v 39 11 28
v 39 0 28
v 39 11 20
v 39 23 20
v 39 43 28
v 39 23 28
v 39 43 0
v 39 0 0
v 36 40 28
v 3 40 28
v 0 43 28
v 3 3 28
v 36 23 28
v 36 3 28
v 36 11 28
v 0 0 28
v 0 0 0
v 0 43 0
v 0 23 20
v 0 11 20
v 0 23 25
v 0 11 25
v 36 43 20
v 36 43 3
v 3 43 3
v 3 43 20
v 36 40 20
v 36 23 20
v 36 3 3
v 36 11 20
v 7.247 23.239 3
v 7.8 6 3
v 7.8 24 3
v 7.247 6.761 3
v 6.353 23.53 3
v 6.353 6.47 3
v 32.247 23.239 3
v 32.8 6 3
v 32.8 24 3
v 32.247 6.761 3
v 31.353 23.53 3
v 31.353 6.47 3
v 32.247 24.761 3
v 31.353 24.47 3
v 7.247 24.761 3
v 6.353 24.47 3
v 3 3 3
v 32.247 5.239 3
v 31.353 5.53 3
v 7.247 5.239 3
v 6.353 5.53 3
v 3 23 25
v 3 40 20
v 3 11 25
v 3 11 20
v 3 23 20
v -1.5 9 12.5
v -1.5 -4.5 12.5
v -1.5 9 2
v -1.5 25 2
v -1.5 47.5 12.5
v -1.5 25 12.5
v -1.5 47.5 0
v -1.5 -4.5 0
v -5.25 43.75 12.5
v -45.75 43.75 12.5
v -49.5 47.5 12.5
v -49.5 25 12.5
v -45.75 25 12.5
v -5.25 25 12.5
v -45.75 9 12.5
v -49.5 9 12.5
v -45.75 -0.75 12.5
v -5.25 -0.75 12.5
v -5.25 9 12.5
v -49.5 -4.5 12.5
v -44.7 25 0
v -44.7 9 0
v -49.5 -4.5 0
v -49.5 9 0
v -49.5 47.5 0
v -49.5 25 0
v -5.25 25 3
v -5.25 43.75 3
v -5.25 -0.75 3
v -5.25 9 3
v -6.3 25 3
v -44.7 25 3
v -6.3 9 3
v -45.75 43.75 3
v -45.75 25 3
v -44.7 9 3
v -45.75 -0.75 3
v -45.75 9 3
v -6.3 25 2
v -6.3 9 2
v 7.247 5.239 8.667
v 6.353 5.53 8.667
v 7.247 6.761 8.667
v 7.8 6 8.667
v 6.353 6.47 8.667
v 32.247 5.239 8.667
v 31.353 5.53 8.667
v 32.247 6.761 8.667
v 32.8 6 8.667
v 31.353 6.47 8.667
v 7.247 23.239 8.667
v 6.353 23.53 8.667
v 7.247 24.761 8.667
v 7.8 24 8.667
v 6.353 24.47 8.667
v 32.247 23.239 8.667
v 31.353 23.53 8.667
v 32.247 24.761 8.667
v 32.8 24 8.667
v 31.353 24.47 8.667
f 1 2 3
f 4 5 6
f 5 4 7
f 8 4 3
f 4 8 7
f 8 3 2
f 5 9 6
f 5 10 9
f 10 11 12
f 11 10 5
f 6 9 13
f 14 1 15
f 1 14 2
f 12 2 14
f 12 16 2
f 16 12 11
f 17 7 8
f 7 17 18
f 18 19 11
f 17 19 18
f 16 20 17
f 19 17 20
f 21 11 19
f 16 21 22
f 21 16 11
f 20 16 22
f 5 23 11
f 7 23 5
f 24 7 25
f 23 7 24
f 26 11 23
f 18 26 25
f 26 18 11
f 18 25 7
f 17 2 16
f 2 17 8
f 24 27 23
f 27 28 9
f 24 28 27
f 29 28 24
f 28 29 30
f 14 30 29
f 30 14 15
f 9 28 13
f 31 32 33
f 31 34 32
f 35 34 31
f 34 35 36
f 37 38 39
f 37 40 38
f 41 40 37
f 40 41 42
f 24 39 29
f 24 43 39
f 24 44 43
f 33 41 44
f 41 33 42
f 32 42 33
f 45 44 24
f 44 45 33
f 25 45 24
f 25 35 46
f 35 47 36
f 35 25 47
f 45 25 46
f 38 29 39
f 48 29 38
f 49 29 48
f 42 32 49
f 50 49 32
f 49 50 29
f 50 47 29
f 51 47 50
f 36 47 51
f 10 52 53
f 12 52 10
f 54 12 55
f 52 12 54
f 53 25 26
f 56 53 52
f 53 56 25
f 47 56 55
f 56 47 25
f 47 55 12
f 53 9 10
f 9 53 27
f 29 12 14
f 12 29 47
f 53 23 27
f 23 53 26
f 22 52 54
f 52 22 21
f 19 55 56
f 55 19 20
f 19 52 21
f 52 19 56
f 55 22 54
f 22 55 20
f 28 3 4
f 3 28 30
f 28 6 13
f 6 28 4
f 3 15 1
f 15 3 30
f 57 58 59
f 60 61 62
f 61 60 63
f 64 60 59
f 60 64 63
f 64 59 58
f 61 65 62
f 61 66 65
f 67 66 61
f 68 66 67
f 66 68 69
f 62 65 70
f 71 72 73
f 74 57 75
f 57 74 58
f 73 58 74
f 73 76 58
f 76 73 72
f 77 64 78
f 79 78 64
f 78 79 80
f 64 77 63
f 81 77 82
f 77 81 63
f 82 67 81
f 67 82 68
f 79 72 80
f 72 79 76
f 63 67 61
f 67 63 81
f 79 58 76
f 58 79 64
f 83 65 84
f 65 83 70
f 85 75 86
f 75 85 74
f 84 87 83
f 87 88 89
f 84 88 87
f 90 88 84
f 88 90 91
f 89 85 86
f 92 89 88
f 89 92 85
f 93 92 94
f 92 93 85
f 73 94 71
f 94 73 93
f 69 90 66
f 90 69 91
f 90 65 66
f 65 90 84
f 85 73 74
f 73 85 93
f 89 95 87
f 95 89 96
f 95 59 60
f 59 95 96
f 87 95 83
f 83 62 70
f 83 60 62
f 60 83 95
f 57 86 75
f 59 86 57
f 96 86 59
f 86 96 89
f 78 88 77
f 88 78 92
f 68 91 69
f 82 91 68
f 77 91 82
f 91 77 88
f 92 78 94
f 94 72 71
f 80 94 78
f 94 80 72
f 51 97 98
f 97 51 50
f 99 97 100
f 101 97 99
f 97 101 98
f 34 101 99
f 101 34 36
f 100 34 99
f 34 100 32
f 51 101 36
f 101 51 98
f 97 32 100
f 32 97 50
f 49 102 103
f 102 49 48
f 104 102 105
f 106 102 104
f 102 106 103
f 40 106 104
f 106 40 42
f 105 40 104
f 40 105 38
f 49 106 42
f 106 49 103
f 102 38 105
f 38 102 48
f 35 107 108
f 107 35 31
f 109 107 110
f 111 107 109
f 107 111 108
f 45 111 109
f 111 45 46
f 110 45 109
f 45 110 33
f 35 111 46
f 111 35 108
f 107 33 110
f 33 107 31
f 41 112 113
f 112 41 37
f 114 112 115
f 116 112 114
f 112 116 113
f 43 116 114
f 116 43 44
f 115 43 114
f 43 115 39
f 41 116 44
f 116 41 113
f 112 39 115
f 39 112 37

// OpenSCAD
// tbv schaakdingetje

// 24 naast elkaar, 32 breed
// 16 vooruit, 36 lang
// 14 hoog rs232, 20 binnen

thickness = 3;
pcb_width = 32 + 1;
pcb_length = 36 + 1;
wiring_height = 25;
connector_height = 17;
radius_pcb_holder = 0.8;

difference() {
  cube([pcb_width + thickness * 2, pcb_length + thickness * 2, wiring_height + thickness]);  // global box
  translate([thickness, thickness, thickness]) cube([pcb_width, pcb_length, wiring_height + 5]);  // inside
  translate([thickness, pcb_length + thickness-1, thickness]) cube([pcb_width, pcb_length + thickness * 2, connector_height]);  // rs232 connector hole
   // slot for usb connector
   translate([-thickness/2, thickness+8, thickness+wiring_height-8]) color([1,0,0]) cube([thickness*2, 12, 5]);
    // slot for antenna
   translate([-thickness/2 + pcb_length, thickness+8, thickness+wiring_height-8]) color([1,0,0]) cube([thickness*2, 12, thickness+8]);    
}

// left back
translate([thickness + 3 + 1, thickness + 3, thickness + connector_height /6]) cylinder(h=connector_height / 3, r1=radius_pcb_holder, r2=radius_pcb_holder, center=true);
// right back
translate([thickness + 24 + 4 + 1, thickness + 3, thickness + connector_height /6]) cylinder(h=connector_height / 3, r1=radius_pcb_holder, r2=radius_pcb_holder, center=true);
// left front
translate([thickness + 3 + 1, thickness + 3 + 17 + 1, thickness + connector_height /6]) cylinder(h=connector_height / 3, r1=radius_pcb_holder, r2=radius_pcb_holder, center=true);
// right front
translate([thickness + 24 + 4 + 1, thickness + 3 + 17 + 1, thickness + connector_height /6]) cylinder(h=connector_height / 3, r1=radius_pcb_holder, r2=radius_pcb_holder, center=true);


//// lid
translate([-thickness*2,0,0])
rotate([0,180,0])
difference() {
    translate([32 * 1.5,0,0]) {
        translate([-thickness*1.5,-thickness*1.5,0])
        rotate([0,180,0])
        difference() {
          cube([pcb_width + thickness * 5, pcb_length + thickness * 5, wiring_height/2 ]);
          translate([thickness *1.25, thickness *1.25, thickness]) cube([pcb_width + thickness * 2.5, pcb_length + thickness * 2.5, thickness * 6]);
        }
    }
    // usb
    color([0,0,1]) translate([thickness*-1.9,9,-(thickness + 10)]) cube([thickness*2, 16, 11]);
    //antenne
    color([1,0,1]) translate([thickness*1.9+pcb_width,9,-(thickness + 10)]) cube([thickness*2, 16, 11+thickness]);
}
